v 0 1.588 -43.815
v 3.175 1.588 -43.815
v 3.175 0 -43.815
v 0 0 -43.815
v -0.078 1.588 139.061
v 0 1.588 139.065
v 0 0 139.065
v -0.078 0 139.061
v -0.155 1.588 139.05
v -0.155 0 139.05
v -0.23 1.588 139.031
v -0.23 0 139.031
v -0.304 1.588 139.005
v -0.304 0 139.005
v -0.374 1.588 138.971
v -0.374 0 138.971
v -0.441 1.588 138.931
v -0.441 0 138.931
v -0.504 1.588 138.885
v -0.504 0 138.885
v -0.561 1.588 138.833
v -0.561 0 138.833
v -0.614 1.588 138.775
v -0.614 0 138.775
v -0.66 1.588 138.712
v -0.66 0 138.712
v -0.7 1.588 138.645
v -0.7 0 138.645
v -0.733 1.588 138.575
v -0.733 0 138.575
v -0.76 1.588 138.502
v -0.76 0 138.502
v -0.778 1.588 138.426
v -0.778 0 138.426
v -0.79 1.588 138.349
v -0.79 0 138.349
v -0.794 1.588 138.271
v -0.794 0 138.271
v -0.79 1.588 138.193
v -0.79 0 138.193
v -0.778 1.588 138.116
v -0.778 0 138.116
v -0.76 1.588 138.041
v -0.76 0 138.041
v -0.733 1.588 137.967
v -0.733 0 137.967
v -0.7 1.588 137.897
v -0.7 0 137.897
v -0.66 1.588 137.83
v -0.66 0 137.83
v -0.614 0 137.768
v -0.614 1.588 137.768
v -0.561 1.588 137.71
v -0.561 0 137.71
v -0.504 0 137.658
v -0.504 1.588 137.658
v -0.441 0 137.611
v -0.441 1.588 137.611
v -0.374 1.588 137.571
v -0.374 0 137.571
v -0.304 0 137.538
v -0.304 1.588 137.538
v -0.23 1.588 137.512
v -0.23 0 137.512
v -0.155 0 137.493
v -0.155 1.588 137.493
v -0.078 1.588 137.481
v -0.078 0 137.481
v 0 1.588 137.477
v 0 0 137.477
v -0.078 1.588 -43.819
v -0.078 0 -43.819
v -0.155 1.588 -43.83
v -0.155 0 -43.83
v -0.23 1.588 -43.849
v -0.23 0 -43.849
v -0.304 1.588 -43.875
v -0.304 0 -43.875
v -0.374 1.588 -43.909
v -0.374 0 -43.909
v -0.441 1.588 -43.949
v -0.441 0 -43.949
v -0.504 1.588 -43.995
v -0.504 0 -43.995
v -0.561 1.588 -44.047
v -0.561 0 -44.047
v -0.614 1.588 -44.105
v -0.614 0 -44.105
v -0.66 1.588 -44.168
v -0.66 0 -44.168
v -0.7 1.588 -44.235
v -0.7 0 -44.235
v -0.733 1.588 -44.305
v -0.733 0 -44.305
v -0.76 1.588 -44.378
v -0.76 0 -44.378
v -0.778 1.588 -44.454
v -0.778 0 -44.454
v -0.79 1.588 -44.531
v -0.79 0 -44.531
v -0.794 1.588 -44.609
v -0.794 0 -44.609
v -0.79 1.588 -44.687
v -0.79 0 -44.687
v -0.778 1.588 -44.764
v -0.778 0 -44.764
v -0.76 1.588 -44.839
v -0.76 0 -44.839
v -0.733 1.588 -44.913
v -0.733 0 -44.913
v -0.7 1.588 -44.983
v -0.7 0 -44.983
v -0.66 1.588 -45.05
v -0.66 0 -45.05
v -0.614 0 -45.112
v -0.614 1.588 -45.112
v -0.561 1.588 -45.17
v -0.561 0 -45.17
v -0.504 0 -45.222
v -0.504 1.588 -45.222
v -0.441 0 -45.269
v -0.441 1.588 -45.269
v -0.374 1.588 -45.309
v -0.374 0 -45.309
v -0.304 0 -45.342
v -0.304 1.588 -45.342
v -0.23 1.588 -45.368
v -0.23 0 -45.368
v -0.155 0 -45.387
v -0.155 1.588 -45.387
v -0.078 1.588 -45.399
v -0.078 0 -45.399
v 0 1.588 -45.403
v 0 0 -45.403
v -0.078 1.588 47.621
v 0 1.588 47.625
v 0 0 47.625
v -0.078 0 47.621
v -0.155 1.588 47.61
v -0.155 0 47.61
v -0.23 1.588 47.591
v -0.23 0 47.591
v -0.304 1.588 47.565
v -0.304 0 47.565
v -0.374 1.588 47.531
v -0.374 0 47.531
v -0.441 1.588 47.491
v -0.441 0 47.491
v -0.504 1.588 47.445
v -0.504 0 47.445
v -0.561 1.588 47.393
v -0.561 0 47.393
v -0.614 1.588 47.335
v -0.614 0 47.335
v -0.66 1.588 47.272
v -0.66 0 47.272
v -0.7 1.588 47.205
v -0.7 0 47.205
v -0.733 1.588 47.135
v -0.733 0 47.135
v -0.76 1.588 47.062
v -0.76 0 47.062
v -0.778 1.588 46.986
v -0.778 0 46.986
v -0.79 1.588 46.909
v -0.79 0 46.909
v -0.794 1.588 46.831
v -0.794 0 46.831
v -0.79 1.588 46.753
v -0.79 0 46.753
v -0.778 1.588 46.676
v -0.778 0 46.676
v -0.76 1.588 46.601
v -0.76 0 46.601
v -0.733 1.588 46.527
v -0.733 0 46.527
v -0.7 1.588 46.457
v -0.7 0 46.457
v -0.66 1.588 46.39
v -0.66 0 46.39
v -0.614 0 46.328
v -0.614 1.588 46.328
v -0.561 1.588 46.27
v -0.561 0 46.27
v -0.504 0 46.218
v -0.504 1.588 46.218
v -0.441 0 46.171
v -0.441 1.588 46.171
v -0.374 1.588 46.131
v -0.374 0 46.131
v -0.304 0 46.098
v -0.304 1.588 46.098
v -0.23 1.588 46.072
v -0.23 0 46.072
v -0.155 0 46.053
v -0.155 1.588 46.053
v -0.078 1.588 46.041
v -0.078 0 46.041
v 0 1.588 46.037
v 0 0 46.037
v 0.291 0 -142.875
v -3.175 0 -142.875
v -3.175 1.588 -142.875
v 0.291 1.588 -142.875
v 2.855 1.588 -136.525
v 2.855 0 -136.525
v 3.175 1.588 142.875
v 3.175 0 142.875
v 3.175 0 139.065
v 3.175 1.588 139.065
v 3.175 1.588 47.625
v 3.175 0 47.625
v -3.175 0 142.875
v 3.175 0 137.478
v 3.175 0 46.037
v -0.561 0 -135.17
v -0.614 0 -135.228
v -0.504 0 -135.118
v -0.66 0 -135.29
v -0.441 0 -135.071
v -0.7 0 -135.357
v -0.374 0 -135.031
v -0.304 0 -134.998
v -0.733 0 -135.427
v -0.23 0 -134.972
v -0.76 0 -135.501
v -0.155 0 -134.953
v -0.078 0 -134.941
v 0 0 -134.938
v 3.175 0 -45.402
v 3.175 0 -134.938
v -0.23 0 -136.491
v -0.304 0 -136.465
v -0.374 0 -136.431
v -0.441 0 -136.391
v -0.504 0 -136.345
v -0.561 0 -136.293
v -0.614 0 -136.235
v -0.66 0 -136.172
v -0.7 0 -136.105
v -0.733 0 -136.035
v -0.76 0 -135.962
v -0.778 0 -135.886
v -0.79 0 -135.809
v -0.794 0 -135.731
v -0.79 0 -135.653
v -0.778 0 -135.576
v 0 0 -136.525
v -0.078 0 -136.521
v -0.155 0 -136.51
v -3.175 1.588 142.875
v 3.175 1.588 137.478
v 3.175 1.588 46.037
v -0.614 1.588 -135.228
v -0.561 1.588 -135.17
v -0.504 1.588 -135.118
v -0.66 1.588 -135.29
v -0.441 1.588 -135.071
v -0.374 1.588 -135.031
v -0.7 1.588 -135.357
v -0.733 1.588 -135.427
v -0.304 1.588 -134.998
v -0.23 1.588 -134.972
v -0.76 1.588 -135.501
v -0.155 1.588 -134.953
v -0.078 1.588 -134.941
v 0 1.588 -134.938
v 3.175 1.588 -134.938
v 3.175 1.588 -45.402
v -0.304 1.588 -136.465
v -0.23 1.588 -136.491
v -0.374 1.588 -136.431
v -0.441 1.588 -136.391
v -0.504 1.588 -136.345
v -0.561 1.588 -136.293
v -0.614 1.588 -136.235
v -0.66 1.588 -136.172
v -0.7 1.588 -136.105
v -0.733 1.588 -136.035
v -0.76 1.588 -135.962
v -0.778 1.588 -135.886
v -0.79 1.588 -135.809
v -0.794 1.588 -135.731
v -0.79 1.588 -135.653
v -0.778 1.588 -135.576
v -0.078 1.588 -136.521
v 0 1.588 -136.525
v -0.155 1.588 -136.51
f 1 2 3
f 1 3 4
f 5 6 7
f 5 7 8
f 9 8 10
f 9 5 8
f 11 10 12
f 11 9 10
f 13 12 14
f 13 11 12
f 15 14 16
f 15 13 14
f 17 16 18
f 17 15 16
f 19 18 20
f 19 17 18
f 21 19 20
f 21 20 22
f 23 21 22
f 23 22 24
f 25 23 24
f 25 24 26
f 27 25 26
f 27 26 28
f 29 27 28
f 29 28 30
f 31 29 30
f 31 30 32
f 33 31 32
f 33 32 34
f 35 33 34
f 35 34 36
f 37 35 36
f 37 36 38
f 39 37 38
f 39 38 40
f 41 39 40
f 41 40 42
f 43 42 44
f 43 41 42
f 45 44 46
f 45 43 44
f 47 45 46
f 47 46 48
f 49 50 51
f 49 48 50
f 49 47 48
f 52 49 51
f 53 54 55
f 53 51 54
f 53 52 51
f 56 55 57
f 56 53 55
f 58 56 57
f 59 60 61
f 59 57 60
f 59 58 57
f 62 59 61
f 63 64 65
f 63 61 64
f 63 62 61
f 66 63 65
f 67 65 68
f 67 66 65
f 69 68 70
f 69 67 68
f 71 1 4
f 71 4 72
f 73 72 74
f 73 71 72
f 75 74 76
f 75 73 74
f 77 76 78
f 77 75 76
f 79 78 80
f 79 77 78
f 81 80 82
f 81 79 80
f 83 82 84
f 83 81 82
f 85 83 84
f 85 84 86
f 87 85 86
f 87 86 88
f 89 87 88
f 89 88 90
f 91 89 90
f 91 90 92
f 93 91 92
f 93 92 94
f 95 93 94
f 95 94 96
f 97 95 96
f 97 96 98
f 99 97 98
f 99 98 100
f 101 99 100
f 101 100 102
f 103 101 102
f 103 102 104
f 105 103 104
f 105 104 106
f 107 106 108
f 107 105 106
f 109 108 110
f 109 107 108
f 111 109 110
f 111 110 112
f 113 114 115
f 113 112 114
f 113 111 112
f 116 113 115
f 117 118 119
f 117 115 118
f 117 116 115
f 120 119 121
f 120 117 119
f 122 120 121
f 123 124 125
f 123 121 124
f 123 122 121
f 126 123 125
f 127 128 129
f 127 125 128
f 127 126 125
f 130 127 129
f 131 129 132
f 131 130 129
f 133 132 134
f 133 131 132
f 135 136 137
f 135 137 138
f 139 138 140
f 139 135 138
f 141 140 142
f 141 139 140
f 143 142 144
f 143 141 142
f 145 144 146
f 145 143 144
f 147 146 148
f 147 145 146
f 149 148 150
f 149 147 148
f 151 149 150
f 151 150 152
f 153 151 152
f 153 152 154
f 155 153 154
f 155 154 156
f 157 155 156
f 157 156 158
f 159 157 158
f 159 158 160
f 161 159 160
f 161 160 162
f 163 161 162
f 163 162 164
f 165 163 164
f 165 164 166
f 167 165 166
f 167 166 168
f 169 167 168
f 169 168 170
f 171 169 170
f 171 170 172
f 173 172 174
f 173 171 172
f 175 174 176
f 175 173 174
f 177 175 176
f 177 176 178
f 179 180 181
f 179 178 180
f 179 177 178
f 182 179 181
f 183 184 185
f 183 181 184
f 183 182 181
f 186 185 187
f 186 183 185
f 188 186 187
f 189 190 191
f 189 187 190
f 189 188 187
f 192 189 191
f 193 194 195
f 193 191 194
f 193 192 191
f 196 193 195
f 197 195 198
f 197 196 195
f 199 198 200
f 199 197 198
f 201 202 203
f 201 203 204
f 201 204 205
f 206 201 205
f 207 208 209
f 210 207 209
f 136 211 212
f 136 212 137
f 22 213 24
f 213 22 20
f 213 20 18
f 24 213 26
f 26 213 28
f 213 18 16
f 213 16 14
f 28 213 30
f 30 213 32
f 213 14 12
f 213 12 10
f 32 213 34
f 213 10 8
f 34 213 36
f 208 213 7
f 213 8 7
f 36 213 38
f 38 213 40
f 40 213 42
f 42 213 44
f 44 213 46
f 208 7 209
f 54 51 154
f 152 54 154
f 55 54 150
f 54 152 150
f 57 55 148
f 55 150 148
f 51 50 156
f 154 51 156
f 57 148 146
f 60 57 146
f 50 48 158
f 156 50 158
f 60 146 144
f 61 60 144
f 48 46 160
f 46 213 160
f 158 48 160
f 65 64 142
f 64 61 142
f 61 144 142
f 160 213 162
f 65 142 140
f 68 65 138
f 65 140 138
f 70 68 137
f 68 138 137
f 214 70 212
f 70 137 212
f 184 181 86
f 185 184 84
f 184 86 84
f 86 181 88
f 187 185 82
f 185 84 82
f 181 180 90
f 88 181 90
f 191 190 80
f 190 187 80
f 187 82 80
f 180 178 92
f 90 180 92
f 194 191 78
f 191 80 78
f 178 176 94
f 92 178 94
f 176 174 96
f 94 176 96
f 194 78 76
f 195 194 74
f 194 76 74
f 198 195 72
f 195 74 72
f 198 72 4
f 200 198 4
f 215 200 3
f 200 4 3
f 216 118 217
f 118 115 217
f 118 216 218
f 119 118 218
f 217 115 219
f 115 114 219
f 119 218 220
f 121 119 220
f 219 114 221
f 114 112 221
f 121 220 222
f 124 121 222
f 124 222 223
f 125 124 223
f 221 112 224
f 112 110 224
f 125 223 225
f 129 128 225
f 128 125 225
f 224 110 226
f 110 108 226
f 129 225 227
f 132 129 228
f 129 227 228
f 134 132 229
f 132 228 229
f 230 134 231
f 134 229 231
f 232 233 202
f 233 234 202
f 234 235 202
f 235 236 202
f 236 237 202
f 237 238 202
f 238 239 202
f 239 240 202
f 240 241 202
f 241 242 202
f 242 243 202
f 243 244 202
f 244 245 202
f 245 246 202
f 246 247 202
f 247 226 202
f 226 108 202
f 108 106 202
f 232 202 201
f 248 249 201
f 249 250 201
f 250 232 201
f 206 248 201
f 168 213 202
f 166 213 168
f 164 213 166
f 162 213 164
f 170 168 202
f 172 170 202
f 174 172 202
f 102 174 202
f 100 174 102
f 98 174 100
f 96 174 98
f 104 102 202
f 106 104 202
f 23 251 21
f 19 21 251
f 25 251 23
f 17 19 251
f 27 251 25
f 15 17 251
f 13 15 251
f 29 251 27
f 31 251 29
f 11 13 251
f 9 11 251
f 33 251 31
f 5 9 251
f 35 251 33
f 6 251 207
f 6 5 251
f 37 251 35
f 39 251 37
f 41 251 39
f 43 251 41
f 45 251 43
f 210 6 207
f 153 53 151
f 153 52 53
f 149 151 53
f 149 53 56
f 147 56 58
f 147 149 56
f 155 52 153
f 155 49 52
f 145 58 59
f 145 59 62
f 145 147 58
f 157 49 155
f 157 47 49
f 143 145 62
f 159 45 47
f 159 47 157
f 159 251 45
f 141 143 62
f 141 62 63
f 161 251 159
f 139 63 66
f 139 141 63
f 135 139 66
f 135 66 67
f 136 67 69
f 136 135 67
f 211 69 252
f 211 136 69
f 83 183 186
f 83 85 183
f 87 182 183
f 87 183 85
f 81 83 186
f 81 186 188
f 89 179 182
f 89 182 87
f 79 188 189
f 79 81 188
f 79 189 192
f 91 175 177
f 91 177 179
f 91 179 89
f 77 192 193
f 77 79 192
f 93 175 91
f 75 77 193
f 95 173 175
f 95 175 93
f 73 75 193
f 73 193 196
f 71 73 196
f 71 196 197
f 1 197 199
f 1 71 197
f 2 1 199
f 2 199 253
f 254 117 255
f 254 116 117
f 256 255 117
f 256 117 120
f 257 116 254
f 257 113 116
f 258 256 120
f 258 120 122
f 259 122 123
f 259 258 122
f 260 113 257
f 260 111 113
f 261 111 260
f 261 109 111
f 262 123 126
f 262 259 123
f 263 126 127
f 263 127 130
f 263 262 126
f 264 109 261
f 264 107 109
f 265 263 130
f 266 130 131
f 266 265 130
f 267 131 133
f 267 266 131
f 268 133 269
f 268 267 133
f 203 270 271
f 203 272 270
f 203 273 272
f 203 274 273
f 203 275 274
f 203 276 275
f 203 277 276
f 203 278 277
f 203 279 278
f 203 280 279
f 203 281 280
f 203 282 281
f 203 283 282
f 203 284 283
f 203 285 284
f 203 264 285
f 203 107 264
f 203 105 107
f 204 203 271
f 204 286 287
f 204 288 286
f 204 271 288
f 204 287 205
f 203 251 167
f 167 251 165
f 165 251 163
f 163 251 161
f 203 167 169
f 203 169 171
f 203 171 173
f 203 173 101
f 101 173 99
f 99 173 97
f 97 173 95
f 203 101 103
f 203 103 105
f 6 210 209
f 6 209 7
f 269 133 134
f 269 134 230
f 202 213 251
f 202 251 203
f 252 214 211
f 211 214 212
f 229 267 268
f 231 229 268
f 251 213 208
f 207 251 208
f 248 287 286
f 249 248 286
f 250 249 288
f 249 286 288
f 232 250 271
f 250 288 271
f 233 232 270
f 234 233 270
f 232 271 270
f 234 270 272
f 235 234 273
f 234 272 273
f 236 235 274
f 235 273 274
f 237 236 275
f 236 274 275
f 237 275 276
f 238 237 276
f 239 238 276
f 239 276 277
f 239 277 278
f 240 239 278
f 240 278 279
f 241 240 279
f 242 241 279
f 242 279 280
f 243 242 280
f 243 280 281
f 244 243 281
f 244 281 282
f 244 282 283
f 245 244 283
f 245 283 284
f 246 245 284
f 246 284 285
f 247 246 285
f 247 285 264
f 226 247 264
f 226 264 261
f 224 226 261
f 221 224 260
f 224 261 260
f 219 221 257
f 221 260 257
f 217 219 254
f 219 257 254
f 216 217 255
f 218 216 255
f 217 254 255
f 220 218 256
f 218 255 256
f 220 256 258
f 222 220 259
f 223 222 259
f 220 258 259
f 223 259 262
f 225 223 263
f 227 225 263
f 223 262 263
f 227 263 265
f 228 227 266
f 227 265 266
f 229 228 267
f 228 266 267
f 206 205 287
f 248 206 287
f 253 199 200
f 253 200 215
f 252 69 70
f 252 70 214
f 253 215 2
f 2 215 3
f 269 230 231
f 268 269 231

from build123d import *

# Parameters (mm, degrees)
SKETCH1_W           = 6.35
SKETCH1_H           = 285.75
BOSS_EXTRUDE1_DEPTH = 1.5875
CUT_EXTRUDE1_REACH  = 144.919
LPATTERN1_COUNT     = 3
LPATTERN1_PITCH     = 91.44
CUT_EXTRUDE3_DEPTH  = 2.54


with BuildPart() as part:
    # Sketch1 → Boss-Extrude1 (new body)
    with BuildSketch(Plane(origin=(0, 0, 0), x_dir=(1, 0, 0), z_dir=(0, 1, 0))):
        Rectangle(SKETCH1_W, SKETCH1_H)
    extrude(amount=BOSS_EXTRUDE1_DEPTH)

    # Sketch2 → Cut-Extrude1 (cut, up to next)
    with BuildSketch(Plane(origin=(0, 1.5875, 0), x_dir=(1, 0, 0), z_dir=(0, 1, 0)), mode=Mode.PRIVATE) as cut_extrude1_sk1:
        with BuildLine():
            Line((3.175, -139.065), (0, -139.065))
            ThreePointArc((0, -139.065), (-0.79375, -138.27125), (0, -137.4775))
            Line((0, -137.4775), (3.175, -137.4775))
            Line((3.175, -137.4775), (3.175, -139.065))
        make_face()
    cut_extrude1_tool1 = extrude(cut_extrude1_sk1.sketch, amount=-CUT_EXTRUDE1_REACH, mode=Mode.PRIVATE) & part.part
    cut_extrude1 = cut_extrude1_tool1.solids().sort_by_distance((1.271664, 1.5875, 138.27125))[0]
    add(cut_extrude1, mode=Mode.SUBTRACT)

    # LPattern1: Cut-Extrude1 ×3
    with Locations(*[(0, 0, -i * LPATTERN1_PITCH) for i in range(1, LPATTERN1_COUNT)]):
        add(cut_extrude1, mode=Mode.SUBTRACT)

    # Sketch4 → Cut-Extrude3 (cut)
    with BuildSketch(Plane(origin=(0, 1.5875, 0), x_dir=(-1, 0, 0), z_dir=(0, 1, 0))):
        with BuildLine():
            Line((-2.85454303, -136.525), (0, -136.525))
            ThreePointArc((0, -136.525), (0.79375, -135.73125), (0, -134.9375))
            Line((0, -134.9375), (-3.175, -134.9375))
            Line((-3.175, -134.9375), (-3.175, -142.875))
            Line((-3.175, -142.875), (-0.290887271, -142.875))
            Line((-0.290887271, -142.875), (-2.85454303, -136.525))
        make_face()
    extrude(amount=-CUT_EXTRUDE3_DEPTH, mode=Mode.SUBTRACT)


solid = part.part
